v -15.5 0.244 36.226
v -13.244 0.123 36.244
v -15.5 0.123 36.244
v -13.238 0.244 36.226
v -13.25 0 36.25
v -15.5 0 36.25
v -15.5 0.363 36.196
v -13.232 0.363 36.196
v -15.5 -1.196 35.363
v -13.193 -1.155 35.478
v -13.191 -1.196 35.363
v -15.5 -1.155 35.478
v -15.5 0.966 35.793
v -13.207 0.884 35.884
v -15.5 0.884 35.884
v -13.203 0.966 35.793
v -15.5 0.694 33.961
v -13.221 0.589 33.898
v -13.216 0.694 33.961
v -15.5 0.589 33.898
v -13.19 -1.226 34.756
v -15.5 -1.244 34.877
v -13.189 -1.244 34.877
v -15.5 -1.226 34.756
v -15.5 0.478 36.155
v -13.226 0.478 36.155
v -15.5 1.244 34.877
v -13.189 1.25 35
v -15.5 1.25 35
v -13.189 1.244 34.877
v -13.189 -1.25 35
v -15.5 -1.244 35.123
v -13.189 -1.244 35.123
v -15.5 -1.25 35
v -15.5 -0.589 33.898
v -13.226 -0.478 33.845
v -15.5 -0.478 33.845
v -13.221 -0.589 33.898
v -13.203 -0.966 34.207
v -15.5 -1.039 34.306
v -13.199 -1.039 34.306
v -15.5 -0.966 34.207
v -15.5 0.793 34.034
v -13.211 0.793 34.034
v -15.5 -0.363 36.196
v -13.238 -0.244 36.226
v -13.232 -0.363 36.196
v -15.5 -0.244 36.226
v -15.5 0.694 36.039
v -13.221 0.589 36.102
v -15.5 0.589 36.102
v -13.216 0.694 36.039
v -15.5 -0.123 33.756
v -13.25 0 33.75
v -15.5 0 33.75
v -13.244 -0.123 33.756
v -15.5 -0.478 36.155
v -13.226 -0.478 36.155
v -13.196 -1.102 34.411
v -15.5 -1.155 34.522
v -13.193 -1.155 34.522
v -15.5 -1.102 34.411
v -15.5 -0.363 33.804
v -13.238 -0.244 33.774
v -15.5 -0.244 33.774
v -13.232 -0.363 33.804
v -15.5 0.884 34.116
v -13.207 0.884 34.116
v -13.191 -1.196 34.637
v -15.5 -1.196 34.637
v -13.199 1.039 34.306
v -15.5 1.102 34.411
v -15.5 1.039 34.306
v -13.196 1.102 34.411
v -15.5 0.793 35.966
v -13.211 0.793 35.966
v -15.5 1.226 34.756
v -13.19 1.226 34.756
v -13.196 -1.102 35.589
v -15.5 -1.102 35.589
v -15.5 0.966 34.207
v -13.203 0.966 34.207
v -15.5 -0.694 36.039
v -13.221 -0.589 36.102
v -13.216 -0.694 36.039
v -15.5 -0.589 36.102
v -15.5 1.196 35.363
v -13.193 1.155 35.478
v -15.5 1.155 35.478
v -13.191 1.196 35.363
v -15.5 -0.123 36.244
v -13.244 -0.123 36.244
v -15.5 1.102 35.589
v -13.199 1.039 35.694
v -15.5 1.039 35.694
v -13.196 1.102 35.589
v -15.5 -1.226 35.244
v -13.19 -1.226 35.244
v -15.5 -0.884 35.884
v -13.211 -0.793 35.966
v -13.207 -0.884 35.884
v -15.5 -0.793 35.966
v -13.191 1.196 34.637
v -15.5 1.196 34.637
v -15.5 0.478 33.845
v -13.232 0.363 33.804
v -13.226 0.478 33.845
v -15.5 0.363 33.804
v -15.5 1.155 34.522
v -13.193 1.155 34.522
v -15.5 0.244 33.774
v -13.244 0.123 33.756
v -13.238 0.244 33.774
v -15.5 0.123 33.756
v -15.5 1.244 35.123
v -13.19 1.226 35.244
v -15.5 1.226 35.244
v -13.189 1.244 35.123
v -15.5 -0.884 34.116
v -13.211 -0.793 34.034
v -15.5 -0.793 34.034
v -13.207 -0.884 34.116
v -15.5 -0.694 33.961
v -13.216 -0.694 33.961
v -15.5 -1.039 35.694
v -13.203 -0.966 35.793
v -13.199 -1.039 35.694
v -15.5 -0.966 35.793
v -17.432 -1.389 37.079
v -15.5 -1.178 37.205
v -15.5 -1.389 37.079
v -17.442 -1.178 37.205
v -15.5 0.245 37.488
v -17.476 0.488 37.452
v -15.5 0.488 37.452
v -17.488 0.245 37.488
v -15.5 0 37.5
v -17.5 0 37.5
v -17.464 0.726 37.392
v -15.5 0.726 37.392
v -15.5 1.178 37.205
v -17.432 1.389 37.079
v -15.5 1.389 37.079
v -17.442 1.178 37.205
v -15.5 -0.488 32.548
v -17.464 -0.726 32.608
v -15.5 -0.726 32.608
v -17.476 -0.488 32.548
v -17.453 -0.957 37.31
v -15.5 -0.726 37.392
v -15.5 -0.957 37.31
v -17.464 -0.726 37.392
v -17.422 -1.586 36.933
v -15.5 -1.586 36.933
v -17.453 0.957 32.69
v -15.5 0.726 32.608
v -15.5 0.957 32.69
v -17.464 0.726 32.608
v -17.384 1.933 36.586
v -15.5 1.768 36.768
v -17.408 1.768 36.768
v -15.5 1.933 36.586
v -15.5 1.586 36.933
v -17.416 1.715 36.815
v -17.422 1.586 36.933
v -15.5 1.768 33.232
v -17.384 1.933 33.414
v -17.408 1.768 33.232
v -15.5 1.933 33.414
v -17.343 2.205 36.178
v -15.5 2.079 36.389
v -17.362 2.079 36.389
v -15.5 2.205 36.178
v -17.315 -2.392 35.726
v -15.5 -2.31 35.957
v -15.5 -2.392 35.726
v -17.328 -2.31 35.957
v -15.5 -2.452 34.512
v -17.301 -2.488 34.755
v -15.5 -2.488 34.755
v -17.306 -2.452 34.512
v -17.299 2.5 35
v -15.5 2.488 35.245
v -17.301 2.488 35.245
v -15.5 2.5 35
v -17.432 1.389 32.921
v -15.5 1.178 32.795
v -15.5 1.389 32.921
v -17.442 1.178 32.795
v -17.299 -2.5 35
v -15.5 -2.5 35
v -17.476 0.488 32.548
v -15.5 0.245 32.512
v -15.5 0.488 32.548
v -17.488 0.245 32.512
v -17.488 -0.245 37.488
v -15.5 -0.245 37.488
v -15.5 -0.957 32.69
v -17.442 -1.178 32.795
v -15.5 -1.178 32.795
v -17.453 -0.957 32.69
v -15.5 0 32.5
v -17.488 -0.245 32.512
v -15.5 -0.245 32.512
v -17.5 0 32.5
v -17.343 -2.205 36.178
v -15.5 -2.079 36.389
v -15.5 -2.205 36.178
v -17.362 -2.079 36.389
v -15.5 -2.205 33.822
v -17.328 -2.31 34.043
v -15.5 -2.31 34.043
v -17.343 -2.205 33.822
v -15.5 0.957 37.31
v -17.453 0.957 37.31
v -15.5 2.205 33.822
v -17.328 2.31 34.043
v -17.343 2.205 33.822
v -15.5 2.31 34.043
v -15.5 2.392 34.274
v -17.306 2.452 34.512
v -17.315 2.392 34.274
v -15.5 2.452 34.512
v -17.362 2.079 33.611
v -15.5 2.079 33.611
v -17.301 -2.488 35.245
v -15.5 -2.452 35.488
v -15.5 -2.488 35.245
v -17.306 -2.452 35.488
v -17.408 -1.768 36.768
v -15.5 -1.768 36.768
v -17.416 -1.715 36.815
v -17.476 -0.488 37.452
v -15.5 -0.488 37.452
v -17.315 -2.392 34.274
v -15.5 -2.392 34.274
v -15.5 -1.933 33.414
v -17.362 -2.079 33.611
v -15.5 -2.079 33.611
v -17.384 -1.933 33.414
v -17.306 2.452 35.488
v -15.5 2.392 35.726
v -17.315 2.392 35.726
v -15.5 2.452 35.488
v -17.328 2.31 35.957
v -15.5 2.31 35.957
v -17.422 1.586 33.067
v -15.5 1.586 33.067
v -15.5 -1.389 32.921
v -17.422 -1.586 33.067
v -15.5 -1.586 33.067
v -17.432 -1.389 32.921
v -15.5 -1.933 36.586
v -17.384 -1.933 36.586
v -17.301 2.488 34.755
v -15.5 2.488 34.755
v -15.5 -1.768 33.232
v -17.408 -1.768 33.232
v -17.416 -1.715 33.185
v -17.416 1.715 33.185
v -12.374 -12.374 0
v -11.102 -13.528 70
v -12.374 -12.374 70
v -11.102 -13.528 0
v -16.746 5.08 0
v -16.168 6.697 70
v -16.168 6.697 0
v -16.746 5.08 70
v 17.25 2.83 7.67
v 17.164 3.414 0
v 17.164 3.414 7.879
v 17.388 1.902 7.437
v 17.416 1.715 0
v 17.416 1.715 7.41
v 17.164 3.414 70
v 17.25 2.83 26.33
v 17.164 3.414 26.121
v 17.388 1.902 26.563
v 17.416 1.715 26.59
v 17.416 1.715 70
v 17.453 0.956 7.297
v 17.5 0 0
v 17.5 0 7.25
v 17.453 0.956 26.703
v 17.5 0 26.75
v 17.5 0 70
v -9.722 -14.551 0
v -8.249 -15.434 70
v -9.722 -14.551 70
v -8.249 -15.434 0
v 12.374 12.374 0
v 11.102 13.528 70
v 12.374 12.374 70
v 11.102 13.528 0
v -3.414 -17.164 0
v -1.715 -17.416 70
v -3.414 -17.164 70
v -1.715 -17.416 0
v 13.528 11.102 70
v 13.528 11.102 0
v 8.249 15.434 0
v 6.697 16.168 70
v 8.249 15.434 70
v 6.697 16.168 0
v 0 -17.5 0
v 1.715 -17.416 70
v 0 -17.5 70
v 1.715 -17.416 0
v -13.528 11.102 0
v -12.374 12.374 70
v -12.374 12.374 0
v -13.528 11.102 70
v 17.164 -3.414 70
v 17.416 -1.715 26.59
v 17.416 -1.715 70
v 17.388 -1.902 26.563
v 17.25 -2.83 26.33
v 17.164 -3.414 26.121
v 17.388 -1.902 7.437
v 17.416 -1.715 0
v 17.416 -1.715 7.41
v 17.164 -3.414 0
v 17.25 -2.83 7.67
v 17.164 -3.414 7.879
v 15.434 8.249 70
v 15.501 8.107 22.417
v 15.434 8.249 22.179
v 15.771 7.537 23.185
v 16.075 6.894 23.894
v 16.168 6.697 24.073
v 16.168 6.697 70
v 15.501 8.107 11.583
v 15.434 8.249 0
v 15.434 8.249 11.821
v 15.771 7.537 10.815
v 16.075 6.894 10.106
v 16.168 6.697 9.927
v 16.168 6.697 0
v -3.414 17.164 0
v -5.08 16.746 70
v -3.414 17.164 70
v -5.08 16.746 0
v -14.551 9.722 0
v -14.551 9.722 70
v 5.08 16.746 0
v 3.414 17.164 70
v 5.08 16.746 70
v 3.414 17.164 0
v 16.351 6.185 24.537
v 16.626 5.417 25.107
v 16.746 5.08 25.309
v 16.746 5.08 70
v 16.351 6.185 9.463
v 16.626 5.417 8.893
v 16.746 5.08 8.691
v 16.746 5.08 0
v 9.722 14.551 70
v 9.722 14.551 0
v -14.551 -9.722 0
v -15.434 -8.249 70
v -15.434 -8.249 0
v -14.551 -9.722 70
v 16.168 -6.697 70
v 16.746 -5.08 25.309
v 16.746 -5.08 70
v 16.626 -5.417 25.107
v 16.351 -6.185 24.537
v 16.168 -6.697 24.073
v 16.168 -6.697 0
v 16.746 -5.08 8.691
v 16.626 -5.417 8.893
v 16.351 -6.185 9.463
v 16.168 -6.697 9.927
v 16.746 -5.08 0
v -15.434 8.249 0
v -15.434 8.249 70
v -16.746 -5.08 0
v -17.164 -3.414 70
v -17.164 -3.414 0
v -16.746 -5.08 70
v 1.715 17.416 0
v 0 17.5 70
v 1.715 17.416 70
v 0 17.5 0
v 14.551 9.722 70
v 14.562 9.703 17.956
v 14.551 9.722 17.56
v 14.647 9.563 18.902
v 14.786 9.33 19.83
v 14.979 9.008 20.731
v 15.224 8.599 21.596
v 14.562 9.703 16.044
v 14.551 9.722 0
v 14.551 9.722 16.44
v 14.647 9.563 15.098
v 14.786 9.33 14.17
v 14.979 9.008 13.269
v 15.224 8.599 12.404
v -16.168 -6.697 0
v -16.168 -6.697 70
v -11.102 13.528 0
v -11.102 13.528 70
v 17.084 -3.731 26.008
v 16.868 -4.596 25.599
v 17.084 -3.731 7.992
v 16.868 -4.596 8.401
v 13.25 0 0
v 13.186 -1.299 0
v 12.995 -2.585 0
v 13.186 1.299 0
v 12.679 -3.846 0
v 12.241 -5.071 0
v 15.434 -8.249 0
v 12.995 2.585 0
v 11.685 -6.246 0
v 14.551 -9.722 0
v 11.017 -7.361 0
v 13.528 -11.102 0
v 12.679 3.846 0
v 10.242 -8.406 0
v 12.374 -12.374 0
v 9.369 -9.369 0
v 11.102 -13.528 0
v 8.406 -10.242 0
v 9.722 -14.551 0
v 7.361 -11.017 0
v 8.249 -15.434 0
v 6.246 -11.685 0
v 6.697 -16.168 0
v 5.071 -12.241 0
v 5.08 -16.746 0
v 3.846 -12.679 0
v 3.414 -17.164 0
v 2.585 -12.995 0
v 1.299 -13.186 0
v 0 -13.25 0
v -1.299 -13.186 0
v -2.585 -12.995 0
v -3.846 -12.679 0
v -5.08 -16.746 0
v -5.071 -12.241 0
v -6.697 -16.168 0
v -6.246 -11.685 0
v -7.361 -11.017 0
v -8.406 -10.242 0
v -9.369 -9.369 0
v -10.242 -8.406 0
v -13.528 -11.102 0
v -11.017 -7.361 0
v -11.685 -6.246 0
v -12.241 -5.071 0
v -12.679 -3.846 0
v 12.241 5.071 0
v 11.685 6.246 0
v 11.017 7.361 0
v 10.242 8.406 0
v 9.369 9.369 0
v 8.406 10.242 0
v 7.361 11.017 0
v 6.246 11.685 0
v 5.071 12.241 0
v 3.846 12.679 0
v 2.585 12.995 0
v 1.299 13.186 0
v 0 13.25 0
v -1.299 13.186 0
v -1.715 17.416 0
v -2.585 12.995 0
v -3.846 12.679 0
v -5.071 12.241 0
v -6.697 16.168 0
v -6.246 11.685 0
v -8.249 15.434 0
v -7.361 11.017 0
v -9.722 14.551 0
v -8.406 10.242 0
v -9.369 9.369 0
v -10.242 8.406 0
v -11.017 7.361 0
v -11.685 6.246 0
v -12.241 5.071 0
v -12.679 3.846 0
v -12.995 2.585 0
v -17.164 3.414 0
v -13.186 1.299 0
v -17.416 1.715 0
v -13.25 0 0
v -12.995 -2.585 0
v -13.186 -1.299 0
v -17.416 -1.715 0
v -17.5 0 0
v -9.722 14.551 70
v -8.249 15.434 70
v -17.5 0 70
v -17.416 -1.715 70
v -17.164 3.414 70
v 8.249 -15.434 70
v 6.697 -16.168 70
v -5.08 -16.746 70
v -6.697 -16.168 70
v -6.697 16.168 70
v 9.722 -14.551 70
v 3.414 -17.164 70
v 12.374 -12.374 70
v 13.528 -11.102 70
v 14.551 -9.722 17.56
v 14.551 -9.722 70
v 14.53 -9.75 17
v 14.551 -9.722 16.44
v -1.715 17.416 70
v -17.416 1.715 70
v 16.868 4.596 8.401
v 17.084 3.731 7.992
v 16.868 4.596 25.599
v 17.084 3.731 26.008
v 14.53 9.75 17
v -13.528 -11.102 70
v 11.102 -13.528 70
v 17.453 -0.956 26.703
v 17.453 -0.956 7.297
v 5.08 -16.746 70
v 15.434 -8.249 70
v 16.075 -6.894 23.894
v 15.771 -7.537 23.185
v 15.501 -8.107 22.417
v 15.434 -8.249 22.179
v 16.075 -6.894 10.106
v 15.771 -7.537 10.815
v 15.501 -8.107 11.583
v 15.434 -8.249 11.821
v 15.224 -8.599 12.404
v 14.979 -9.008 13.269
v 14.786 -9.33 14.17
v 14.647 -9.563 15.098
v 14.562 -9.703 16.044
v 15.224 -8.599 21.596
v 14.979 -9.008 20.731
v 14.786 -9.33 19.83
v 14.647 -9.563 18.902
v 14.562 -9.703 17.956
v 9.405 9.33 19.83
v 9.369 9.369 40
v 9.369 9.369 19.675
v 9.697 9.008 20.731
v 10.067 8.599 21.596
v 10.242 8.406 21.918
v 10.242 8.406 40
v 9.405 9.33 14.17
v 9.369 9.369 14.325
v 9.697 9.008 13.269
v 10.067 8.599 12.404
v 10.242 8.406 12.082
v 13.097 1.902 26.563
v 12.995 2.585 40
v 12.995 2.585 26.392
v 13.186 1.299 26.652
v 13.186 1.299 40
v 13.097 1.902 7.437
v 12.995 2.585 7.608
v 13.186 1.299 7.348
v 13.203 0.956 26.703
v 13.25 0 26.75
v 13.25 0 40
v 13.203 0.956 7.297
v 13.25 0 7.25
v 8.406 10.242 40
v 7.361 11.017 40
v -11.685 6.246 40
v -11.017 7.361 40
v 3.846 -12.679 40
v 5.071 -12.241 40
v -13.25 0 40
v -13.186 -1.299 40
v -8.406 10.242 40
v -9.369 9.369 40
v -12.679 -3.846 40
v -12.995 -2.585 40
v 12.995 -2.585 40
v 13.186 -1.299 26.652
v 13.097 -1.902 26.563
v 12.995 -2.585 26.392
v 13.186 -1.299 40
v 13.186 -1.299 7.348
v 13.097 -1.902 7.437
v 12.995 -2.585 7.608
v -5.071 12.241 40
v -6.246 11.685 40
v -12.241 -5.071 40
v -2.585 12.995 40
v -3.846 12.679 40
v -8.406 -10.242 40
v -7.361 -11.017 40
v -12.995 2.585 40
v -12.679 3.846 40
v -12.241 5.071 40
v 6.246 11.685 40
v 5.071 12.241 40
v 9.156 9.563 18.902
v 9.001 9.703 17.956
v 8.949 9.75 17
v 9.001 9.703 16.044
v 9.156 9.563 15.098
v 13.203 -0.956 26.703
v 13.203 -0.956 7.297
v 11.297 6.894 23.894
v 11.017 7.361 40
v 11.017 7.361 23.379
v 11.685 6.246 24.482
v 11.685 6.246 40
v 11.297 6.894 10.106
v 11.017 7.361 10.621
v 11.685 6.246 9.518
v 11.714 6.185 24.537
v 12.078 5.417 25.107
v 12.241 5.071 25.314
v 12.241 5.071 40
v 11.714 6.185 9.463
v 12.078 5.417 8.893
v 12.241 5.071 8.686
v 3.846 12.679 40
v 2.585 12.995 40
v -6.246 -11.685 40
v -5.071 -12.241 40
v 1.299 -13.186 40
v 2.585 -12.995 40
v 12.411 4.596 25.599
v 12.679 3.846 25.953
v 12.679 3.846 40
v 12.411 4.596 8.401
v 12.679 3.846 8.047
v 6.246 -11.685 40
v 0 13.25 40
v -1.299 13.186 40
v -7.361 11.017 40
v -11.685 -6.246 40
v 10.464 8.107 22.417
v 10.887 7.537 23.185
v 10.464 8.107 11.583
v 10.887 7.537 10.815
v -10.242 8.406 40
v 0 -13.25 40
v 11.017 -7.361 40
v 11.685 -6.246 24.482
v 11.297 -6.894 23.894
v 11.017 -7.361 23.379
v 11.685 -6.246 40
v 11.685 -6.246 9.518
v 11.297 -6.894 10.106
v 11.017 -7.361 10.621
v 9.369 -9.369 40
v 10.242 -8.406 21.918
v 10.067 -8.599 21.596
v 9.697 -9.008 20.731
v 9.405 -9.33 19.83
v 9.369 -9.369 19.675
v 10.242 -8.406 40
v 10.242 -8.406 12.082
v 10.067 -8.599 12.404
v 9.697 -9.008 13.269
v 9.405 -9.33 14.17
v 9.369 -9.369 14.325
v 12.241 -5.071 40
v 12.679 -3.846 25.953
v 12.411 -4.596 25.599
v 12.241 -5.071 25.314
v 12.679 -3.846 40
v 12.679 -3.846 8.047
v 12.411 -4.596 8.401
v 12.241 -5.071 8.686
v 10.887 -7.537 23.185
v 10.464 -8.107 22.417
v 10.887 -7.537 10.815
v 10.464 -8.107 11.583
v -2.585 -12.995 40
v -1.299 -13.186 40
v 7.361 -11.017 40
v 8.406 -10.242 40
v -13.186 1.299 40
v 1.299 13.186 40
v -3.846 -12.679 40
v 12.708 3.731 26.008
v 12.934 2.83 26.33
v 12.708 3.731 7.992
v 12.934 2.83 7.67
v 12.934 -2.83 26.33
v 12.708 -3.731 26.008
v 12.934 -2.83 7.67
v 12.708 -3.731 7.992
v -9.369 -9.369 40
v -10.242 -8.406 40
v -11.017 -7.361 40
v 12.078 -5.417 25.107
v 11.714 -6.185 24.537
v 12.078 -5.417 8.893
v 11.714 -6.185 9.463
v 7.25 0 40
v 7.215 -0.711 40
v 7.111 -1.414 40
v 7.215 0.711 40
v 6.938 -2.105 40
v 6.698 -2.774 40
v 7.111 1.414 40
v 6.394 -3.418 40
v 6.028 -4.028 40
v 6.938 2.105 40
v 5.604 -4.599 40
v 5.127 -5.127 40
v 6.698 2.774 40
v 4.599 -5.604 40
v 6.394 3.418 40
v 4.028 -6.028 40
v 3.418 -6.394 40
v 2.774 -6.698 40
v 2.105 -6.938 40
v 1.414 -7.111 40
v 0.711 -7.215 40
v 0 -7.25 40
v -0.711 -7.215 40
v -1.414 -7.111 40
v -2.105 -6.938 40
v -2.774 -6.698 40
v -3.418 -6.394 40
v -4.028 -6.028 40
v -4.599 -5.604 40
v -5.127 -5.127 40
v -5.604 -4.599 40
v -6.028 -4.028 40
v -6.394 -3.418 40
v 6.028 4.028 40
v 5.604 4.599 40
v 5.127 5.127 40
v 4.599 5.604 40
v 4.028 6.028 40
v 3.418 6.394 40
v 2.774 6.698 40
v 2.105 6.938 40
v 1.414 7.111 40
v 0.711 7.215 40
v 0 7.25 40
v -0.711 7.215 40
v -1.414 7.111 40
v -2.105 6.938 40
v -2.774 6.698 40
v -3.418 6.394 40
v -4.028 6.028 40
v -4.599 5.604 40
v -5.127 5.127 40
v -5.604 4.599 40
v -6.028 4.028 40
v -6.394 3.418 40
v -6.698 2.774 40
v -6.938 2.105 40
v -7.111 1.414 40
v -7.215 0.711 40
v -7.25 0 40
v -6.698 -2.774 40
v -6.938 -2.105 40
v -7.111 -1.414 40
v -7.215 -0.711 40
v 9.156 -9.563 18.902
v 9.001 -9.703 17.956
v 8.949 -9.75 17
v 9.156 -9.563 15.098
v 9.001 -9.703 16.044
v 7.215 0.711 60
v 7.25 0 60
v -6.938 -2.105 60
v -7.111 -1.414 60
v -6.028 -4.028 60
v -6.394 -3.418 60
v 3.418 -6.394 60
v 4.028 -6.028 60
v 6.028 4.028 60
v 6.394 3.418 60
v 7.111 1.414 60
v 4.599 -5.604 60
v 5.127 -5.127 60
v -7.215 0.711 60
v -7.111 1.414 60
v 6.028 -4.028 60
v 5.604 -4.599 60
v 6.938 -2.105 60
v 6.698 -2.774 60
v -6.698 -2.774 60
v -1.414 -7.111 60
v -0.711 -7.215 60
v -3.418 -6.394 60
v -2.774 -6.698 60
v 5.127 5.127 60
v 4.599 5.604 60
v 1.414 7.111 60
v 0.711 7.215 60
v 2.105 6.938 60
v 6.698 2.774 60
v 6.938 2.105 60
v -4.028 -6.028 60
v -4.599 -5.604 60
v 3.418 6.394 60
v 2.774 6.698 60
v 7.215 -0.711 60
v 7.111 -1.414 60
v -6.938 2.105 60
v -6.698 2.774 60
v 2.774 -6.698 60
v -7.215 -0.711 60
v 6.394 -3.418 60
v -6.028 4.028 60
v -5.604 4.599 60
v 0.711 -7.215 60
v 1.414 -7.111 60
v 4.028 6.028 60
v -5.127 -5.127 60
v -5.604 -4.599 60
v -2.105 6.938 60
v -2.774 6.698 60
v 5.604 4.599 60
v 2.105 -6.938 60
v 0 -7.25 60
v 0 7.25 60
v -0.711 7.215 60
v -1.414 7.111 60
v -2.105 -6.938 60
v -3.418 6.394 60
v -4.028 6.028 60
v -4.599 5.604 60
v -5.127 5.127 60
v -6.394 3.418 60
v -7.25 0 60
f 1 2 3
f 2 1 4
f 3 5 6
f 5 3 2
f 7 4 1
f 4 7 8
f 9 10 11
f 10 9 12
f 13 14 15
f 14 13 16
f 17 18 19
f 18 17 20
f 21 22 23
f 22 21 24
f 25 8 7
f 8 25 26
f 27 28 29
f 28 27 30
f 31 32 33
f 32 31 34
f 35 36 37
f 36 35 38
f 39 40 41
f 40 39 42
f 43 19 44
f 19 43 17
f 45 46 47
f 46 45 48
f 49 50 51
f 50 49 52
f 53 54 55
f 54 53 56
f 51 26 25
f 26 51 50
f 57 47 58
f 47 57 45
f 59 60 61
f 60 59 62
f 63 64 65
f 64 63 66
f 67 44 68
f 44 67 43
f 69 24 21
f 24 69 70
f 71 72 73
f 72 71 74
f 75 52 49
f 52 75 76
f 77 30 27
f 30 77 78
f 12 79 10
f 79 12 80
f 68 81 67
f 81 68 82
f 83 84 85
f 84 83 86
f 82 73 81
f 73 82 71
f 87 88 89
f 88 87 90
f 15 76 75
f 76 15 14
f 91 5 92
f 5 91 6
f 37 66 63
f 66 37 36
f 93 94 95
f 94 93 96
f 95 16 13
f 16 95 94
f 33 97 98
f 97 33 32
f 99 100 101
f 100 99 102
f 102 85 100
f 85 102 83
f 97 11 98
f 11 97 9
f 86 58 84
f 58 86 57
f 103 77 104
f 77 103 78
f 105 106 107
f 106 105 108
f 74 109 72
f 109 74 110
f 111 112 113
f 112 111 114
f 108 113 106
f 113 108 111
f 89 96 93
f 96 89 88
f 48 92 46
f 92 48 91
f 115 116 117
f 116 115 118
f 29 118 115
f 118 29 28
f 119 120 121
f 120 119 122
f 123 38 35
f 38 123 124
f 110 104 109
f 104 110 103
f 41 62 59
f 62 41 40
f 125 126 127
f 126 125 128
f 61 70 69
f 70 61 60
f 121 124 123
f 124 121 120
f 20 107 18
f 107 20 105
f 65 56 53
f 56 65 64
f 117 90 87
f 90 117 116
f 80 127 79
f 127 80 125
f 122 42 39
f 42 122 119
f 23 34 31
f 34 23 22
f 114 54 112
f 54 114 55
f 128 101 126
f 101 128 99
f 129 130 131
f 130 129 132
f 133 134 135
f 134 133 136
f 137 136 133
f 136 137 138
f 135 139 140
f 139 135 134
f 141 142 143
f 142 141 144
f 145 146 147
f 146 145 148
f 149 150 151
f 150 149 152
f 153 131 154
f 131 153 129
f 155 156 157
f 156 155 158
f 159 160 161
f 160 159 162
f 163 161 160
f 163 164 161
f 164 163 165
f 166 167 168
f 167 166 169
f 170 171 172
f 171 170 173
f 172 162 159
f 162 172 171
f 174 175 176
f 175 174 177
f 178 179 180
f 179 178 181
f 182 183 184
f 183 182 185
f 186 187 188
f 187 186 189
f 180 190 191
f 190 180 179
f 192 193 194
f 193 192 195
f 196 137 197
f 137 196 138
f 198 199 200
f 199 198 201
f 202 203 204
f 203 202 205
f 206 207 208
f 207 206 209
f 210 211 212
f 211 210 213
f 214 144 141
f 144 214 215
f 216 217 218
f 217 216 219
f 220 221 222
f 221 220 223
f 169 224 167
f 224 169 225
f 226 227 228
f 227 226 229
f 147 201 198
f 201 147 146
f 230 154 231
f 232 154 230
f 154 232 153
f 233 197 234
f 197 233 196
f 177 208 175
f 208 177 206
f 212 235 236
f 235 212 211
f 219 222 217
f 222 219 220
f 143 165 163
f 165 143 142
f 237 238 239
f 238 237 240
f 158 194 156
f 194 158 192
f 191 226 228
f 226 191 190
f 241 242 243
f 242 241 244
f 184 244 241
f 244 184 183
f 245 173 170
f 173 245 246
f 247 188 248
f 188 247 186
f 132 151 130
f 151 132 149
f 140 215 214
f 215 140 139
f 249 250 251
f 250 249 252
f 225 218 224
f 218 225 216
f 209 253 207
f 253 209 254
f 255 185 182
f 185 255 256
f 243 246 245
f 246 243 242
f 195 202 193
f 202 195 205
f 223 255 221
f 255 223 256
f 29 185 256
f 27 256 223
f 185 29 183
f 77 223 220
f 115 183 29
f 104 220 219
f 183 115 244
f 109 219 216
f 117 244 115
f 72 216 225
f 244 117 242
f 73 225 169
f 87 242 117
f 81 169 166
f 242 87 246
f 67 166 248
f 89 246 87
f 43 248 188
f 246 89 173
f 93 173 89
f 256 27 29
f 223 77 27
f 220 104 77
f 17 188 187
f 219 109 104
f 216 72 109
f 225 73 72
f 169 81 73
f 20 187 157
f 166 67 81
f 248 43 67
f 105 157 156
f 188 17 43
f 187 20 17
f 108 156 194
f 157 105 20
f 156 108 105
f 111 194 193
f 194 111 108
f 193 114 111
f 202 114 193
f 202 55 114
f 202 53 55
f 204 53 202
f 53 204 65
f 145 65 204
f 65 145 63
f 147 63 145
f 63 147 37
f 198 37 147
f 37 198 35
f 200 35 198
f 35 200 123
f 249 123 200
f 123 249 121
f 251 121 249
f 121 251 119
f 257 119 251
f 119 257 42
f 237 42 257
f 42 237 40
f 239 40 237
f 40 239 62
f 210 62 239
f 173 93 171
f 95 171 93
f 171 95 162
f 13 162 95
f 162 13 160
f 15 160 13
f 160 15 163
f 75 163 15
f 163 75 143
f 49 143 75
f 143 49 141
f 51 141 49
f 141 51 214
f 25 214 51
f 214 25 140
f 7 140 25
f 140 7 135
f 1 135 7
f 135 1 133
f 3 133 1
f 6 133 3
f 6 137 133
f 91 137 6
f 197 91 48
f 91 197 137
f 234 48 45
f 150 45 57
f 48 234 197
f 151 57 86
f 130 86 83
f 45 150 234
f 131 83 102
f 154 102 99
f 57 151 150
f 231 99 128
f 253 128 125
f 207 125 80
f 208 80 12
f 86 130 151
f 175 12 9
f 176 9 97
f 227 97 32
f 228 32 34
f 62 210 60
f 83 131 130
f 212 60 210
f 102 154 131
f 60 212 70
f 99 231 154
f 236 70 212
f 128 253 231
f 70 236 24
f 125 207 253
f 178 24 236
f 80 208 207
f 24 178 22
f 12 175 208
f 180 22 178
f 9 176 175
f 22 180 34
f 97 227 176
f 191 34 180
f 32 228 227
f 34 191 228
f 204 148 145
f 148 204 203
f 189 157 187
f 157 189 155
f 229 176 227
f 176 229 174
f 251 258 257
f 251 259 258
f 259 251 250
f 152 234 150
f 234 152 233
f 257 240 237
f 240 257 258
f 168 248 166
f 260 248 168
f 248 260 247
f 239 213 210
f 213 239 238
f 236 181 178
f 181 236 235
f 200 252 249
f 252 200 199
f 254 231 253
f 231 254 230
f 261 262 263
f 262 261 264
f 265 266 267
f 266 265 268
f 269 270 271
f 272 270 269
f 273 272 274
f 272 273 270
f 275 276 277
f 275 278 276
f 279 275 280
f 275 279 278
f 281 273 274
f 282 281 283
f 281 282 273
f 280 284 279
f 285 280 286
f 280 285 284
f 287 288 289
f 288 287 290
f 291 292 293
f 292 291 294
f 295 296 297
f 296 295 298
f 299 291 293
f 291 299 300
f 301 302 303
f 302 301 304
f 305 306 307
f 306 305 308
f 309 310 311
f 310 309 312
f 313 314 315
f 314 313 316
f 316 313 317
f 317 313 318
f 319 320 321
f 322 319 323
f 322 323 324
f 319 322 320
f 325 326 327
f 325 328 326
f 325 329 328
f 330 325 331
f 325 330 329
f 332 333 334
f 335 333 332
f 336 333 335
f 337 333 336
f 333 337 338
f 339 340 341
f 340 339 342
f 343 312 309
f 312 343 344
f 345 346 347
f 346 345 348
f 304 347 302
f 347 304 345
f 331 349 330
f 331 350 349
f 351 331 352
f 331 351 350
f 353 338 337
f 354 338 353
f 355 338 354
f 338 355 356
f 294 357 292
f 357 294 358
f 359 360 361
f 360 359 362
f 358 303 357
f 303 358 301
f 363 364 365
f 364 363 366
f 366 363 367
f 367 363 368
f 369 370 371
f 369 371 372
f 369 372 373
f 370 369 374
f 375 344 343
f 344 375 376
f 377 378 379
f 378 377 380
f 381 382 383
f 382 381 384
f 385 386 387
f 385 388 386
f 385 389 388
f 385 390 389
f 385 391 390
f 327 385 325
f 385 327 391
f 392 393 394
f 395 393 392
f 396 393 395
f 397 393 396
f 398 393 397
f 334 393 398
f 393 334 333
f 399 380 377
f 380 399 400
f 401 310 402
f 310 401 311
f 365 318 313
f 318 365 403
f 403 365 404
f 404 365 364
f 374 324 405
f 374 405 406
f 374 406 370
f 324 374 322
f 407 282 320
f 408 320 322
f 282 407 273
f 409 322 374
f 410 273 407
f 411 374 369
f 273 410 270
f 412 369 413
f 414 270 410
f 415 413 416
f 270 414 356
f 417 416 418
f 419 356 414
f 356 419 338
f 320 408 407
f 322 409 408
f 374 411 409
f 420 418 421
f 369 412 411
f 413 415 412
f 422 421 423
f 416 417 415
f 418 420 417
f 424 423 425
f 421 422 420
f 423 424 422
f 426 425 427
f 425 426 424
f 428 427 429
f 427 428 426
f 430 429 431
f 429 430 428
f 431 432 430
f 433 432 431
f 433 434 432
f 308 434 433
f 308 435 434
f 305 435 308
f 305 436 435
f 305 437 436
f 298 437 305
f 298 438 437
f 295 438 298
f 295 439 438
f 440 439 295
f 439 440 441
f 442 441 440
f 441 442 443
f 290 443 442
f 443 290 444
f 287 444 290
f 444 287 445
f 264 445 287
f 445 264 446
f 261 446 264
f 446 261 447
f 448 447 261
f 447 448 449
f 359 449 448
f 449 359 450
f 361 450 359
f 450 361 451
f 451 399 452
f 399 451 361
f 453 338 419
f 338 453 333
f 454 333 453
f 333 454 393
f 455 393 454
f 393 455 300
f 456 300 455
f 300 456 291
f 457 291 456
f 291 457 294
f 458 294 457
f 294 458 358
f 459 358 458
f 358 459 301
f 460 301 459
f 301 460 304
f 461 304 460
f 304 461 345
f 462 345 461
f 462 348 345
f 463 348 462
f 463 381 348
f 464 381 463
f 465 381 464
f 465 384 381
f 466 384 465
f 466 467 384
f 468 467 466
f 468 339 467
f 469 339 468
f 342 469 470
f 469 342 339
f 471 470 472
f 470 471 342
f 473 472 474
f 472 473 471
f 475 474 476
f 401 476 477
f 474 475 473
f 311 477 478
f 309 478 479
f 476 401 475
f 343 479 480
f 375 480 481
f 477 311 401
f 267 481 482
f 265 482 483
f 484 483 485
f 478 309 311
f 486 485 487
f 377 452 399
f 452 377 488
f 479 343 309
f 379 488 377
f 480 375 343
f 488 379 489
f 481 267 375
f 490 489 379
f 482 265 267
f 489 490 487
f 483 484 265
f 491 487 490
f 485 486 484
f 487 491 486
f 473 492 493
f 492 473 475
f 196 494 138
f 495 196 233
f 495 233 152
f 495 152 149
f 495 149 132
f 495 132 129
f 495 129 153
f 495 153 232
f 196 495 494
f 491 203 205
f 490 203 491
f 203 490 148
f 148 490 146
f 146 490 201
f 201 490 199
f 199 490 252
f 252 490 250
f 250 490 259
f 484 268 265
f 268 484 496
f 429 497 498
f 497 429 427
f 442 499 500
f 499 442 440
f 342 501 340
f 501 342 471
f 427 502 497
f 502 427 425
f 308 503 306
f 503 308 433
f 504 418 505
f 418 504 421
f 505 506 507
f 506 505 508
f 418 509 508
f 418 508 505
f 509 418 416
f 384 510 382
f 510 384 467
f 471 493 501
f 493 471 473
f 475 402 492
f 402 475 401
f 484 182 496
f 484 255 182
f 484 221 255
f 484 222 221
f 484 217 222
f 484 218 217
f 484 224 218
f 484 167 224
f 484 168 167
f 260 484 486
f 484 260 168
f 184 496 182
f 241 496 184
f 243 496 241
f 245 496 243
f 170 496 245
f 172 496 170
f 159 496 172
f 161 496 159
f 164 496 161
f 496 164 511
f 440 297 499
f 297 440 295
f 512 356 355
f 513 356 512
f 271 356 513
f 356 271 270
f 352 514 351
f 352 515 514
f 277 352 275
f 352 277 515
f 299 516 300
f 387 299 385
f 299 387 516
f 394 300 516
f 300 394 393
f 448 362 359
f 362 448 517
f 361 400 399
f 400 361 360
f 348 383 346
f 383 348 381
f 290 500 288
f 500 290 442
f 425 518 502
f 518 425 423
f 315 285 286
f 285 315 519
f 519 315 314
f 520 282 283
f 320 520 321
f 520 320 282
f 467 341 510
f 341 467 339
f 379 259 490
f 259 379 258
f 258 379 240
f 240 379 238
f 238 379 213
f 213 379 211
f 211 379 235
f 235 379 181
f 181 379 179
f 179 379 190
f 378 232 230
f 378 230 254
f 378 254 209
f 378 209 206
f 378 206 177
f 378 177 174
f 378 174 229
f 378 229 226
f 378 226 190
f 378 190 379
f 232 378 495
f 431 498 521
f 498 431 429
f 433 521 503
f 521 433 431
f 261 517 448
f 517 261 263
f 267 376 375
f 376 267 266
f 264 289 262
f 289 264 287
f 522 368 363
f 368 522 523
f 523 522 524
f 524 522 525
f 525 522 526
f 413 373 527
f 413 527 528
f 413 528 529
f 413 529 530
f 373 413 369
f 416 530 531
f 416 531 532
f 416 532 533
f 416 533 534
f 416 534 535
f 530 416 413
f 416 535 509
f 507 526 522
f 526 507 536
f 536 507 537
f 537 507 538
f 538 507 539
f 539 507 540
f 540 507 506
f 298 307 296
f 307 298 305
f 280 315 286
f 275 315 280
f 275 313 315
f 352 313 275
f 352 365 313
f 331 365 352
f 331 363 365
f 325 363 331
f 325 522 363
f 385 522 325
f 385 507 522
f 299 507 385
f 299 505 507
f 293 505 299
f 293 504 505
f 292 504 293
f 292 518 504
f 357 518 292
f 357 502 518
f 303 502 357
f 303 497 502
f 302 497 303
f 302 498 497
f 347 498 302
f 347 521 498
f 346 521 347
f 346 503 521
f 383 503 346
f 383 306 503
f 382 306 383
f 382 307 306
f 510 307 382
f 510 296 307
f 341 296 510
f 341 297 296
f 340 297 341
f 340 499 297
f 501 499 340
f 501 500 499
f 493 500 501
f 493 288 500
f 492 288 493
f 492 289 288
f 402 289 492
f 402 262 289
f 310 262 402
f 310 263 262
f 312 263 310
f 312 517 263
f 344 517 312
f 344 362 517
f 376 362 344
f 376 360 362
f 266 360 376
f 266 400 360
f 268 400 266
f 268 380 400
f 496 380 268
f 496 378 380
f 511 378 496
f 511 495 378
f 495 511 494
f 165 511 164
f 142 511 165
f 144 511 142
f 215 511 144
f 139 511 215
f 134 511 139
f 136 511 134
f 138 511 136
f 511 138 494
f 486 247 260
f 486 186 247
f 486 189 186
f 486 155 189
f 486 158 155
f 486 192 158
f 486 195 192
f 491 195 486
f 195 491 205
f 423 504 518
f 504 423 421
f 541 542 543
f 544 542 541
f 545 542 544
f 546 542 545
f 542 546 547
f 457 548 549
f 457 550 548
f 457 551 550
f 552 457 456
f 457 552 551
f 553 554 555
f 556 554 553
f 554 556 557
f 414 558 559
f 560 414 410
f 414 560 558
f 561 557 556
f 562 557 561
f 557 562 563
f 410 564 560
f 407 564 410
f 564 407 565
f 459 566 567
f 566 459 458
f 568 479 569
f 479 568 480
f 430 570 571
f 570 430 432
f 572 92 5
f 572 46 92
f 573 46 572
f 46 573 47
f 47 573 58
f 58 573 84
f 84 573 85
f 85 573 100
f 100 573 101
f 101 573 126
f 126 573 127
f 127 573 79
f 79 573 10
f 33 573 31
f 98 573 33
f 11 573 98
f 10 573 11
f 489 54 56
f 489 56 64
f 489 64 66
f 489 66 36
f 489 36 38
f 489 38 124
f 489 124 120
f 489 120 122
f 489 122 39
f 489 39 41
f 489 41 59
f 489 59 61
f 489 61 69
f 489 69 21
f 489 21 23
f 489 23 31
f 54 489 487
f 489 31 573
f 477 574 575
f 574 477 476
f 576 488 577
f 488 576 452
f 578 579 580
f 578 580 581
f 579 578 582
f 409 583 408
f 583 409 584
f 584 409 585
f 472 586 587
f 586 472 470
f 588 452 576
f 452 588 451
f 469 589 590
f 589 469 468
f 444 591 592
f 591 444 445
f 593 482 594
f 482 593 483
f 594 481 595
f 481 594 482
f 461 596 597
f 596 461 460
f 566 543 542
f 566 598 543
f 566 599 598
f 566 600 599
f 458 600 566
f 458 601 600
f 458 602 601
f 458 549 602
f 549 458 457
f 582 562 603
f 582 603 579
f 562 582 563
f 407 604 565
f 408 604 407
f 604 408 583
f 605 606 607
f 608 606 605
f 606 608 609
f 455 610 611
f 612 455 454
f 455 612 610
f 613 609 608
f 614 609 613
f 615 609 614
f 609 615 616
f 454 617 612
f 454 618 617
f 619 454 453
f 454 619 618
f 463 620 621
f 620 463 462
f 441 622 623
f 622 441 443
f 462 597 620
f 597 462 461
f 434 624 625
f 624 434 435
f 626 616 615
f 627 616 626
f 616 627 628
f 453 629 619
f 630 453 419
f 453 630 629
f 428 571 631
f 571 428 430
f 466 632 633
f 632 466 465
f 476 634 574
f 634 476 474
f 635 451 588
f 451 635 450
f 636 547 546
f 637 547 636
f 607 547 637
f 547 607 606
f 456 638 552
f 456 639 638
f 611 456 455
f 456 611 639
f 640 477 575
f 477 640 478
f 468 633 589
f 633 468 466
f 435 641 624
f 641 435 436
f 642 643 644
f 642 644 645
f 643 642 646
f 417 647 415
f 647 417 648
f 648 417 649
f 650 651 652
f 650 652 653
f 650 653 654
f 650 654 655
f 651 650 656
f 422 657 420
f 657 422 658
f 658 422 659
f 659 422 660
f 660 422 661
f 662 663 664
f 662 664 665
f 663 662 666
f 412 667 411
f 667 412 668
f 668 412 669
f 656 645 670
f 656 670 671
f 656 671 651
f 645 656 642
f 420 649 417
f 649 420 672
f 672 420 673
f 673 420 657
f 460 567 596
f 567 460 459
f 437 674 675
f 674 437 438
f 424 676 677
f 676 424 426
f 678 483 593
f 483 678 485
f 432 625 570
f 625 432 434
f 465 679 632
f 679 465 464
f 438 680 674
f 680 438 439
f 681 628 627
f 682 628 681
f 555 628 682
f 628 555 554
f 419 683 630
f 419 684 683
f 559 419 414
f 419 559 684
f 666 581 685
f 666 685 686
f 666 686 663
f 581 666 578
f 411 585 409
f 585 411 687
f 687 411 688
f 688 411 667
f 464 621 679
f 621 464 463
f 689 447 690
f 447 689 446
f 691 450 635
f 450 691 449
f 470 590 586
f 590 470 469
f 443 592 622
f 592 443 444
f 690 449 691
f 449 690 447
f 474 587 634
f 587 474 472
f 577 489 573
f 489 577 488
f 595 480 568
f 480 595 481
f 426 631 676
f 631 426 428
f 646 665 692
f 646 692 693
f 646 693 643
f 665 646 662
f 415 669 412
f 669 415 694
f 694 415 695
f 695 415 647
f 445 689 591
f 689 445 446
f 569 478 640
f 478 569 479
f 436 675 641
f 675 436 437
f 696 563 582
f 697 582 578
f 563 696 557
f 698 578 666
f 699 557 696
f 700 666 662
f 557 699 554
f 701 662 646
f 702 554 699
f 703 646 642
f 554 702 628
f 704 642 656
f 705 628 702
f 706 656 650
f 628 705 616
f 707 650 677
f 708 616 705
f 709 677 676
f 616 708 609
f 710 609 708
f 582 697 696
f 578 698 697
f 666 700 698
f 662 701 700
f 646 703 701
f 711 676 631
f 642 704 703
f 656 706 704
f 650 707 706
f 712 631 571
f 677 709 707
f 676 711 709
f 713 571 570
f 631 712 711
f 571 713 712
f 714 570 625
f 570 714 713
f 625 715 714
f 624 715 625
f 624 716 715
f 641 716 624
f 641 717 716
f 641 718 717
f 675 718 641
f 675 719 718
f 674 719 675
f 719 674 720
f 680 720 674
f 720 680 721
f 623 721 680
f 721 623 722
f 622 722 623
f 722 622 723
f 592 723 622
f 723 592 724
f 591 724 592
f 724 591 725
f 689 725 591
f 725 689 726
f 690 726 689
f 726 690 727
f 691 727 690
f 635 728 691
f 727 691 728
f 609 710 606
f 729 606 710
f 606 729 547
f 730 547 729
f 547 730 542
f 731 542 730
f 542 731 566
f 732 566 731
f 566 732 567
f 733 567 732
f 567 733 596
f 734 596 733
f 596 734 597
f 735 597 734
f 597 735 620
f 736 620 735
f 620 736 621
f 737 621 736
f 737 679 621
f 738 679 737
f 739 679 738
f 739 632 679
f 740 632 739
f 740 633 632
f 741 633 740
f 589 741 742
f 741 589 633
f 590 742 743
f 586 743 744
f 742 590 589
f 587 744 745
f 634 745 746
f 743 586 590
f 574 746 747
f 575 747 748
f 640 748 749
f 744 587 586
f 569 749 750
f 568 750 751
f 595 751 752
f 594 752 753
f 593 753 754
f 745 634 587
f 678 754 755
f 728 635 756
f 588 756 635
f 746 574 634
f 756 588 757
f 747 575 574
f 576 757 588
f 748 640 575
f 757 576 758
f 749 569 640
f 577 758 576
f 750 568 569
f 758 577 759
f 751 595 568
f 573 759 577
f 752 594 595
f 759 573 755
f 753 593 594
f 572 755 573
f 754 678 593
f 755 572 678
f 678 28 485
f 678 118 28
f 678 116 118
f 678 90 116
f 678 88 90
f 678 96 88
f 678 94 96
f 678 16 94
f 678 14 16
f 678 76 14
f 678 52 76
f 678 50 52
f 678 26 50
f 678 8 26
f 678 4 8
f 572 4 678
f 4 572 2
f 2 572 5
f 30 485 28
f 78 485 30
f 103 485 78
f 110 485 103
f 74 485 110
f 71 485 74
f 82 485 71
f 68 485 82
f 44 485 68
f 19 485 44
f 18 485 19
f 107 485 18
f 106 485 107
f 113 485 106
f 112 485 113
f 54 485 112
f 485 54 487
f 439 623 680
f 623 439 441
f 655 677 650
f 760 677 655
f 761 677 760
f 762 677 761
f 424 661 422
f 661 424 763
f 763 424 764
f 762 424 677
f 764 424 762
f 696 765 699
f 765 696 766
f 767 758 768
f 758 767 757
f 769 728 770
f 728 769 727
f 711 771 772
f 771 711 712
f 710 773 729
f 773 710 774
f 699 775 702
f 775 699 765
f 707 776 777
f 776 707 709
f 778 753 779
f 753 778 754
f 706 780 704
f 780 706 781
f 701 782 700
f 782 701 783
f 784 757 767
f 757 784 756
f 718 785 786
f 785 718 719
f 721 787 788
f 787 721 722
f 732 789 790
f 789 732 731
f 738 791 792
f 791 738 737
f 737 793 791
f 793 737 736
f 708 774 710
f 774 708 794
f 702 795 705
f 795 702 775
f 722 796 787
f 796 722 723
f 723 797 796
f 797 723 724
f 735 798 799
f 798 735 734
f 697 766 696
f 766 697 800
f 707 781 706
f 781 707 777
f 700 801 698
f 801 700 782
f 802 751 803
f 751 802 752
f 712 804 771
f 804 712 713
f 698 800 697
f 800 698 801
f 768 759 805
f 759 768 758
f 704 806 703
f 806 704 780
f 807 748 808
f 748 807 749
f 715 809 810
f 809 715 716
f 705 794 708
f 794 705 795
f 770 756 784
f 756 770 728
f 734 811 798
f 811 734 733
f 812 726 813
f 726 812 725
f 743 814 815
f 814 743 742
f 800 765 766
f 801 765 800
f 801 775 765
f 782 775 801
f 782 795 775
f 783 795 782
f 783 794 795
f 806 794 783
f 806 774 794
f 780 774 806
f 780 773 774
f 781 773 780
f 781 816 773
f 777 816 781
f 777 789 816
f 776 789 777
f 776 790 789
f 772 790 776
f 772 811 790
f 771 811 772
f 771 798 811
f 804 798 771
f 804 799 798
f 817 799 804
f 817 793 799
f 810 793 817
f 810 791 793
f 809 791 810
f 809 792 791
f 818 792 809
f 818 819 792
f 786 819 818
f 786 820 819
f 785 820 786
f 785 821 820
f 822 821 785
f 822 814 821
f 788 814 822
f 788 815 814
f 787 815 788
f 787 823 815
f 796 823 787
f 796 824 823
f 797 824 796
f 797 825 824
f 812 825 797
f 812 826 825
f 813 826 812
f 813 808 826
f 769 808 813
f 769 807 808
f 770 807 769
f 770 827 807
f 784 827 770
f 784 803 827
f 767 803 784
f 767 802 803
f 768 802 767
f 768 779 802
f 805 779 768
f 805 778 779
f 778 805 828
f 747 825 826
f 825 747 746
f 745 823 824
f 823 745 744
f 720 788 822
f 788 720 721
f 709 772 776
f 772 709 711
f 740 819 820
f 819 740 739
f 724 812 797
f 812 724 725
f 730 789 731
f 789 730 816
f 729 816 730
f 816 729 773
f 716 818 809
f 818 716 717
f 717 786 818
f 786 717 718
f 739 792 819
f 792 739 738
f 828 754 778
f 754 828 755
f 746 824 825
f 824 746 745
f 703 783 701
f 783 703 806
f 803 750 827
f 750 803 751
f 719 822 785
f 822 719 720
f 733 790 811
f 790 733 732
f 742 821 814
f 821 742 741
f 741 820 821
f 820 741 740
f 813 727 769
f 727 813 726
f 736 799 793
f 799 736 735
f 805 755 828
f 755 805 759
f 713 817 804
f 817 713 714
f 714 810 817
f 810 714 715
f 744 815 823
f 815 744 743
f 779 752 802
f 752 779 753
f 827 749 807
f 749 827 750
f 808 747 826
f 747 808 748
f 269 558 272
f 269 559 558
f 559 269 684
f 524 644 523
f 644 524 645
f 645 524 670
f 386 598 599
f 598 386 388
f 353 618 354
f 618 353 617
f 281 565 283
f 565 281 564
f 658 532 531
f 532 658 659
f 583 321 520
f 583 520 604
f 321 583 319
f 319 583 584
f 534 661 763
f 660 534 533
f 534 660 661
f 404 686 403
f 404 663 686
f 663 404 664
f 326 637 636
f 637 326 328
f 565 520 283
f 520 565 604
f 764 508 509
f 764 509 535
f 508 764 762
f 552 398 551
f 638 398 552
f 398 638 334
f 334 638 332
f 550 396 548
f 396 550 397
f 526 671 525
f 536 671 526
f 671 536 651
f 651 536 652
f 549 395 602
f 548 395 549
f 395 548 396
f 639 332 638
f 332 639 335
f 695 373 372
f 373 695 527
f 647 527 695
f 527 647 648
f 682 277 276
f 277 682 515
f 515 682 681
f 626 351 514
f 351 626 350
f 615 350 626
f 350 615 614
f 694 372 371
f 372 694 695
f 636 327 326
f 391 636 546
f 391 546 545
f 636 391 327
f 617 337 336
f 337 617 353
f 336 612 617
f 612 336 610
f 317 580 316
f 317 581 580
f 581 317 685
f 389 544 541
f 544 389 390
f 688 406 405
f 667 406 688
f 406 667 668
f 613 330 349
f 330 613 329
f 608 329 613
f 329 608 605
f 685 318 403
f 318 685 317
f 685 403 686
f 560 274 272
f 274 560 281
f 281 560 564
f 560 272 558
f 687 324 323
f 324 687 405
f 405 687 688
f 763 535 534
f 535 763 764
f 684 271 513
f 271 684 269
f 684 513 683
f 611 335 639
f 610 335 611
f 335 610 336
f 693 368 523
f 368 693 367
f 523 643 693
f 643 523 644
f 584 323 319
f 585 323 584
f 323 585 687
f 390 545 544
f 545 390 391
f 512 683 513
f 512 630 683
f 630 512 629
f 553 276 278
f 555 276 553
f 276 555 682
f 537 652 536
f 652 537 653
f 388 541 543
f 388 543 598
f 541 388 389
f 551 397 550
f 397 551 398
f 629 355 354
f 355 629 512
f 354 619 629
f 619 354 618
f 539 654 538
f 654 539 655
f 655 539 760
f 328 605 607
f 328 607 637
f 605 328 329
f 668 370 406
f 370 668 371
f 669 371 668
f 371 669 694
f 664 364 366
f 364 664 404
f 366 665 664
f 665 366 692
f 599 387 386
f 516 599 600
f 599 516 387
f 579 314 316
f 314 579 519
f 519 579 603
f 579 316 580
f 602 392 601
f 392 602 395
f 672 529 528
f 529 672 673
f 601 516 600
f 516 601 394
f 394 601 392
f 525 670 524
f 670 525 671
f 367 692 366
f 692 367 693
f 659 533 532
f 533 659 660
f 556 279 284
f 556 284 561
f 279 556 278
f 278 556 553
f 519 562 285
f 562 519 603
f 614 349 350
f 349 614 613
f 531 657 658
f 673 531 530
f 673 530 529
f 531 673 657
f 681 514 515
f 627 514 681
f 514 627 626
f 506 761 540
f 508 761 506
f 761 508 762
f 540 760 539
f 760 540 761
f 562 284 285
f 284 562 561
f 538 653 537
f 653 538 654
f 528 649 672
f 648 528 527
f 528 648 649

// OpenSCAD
$fn=64;

difference() {
  cylinder(r=17.5,h=70);
  translate([0,0,-0.1]) cylinder(r=13.25,h=40.1);
  translate([0,0,-0.1]) cylinder(r=7.25,h=60.1);
  translate([0,0,17]) rotate([0,90,0]) cylinder(r=9.75,h=50);
  translate([0,0,35]) rotate([0,-90,0]) {
    cylinder(r=1.25,h=50);
    translate([0,0,15.5]) cylinder(r=2.5,h=50);

   }
}
